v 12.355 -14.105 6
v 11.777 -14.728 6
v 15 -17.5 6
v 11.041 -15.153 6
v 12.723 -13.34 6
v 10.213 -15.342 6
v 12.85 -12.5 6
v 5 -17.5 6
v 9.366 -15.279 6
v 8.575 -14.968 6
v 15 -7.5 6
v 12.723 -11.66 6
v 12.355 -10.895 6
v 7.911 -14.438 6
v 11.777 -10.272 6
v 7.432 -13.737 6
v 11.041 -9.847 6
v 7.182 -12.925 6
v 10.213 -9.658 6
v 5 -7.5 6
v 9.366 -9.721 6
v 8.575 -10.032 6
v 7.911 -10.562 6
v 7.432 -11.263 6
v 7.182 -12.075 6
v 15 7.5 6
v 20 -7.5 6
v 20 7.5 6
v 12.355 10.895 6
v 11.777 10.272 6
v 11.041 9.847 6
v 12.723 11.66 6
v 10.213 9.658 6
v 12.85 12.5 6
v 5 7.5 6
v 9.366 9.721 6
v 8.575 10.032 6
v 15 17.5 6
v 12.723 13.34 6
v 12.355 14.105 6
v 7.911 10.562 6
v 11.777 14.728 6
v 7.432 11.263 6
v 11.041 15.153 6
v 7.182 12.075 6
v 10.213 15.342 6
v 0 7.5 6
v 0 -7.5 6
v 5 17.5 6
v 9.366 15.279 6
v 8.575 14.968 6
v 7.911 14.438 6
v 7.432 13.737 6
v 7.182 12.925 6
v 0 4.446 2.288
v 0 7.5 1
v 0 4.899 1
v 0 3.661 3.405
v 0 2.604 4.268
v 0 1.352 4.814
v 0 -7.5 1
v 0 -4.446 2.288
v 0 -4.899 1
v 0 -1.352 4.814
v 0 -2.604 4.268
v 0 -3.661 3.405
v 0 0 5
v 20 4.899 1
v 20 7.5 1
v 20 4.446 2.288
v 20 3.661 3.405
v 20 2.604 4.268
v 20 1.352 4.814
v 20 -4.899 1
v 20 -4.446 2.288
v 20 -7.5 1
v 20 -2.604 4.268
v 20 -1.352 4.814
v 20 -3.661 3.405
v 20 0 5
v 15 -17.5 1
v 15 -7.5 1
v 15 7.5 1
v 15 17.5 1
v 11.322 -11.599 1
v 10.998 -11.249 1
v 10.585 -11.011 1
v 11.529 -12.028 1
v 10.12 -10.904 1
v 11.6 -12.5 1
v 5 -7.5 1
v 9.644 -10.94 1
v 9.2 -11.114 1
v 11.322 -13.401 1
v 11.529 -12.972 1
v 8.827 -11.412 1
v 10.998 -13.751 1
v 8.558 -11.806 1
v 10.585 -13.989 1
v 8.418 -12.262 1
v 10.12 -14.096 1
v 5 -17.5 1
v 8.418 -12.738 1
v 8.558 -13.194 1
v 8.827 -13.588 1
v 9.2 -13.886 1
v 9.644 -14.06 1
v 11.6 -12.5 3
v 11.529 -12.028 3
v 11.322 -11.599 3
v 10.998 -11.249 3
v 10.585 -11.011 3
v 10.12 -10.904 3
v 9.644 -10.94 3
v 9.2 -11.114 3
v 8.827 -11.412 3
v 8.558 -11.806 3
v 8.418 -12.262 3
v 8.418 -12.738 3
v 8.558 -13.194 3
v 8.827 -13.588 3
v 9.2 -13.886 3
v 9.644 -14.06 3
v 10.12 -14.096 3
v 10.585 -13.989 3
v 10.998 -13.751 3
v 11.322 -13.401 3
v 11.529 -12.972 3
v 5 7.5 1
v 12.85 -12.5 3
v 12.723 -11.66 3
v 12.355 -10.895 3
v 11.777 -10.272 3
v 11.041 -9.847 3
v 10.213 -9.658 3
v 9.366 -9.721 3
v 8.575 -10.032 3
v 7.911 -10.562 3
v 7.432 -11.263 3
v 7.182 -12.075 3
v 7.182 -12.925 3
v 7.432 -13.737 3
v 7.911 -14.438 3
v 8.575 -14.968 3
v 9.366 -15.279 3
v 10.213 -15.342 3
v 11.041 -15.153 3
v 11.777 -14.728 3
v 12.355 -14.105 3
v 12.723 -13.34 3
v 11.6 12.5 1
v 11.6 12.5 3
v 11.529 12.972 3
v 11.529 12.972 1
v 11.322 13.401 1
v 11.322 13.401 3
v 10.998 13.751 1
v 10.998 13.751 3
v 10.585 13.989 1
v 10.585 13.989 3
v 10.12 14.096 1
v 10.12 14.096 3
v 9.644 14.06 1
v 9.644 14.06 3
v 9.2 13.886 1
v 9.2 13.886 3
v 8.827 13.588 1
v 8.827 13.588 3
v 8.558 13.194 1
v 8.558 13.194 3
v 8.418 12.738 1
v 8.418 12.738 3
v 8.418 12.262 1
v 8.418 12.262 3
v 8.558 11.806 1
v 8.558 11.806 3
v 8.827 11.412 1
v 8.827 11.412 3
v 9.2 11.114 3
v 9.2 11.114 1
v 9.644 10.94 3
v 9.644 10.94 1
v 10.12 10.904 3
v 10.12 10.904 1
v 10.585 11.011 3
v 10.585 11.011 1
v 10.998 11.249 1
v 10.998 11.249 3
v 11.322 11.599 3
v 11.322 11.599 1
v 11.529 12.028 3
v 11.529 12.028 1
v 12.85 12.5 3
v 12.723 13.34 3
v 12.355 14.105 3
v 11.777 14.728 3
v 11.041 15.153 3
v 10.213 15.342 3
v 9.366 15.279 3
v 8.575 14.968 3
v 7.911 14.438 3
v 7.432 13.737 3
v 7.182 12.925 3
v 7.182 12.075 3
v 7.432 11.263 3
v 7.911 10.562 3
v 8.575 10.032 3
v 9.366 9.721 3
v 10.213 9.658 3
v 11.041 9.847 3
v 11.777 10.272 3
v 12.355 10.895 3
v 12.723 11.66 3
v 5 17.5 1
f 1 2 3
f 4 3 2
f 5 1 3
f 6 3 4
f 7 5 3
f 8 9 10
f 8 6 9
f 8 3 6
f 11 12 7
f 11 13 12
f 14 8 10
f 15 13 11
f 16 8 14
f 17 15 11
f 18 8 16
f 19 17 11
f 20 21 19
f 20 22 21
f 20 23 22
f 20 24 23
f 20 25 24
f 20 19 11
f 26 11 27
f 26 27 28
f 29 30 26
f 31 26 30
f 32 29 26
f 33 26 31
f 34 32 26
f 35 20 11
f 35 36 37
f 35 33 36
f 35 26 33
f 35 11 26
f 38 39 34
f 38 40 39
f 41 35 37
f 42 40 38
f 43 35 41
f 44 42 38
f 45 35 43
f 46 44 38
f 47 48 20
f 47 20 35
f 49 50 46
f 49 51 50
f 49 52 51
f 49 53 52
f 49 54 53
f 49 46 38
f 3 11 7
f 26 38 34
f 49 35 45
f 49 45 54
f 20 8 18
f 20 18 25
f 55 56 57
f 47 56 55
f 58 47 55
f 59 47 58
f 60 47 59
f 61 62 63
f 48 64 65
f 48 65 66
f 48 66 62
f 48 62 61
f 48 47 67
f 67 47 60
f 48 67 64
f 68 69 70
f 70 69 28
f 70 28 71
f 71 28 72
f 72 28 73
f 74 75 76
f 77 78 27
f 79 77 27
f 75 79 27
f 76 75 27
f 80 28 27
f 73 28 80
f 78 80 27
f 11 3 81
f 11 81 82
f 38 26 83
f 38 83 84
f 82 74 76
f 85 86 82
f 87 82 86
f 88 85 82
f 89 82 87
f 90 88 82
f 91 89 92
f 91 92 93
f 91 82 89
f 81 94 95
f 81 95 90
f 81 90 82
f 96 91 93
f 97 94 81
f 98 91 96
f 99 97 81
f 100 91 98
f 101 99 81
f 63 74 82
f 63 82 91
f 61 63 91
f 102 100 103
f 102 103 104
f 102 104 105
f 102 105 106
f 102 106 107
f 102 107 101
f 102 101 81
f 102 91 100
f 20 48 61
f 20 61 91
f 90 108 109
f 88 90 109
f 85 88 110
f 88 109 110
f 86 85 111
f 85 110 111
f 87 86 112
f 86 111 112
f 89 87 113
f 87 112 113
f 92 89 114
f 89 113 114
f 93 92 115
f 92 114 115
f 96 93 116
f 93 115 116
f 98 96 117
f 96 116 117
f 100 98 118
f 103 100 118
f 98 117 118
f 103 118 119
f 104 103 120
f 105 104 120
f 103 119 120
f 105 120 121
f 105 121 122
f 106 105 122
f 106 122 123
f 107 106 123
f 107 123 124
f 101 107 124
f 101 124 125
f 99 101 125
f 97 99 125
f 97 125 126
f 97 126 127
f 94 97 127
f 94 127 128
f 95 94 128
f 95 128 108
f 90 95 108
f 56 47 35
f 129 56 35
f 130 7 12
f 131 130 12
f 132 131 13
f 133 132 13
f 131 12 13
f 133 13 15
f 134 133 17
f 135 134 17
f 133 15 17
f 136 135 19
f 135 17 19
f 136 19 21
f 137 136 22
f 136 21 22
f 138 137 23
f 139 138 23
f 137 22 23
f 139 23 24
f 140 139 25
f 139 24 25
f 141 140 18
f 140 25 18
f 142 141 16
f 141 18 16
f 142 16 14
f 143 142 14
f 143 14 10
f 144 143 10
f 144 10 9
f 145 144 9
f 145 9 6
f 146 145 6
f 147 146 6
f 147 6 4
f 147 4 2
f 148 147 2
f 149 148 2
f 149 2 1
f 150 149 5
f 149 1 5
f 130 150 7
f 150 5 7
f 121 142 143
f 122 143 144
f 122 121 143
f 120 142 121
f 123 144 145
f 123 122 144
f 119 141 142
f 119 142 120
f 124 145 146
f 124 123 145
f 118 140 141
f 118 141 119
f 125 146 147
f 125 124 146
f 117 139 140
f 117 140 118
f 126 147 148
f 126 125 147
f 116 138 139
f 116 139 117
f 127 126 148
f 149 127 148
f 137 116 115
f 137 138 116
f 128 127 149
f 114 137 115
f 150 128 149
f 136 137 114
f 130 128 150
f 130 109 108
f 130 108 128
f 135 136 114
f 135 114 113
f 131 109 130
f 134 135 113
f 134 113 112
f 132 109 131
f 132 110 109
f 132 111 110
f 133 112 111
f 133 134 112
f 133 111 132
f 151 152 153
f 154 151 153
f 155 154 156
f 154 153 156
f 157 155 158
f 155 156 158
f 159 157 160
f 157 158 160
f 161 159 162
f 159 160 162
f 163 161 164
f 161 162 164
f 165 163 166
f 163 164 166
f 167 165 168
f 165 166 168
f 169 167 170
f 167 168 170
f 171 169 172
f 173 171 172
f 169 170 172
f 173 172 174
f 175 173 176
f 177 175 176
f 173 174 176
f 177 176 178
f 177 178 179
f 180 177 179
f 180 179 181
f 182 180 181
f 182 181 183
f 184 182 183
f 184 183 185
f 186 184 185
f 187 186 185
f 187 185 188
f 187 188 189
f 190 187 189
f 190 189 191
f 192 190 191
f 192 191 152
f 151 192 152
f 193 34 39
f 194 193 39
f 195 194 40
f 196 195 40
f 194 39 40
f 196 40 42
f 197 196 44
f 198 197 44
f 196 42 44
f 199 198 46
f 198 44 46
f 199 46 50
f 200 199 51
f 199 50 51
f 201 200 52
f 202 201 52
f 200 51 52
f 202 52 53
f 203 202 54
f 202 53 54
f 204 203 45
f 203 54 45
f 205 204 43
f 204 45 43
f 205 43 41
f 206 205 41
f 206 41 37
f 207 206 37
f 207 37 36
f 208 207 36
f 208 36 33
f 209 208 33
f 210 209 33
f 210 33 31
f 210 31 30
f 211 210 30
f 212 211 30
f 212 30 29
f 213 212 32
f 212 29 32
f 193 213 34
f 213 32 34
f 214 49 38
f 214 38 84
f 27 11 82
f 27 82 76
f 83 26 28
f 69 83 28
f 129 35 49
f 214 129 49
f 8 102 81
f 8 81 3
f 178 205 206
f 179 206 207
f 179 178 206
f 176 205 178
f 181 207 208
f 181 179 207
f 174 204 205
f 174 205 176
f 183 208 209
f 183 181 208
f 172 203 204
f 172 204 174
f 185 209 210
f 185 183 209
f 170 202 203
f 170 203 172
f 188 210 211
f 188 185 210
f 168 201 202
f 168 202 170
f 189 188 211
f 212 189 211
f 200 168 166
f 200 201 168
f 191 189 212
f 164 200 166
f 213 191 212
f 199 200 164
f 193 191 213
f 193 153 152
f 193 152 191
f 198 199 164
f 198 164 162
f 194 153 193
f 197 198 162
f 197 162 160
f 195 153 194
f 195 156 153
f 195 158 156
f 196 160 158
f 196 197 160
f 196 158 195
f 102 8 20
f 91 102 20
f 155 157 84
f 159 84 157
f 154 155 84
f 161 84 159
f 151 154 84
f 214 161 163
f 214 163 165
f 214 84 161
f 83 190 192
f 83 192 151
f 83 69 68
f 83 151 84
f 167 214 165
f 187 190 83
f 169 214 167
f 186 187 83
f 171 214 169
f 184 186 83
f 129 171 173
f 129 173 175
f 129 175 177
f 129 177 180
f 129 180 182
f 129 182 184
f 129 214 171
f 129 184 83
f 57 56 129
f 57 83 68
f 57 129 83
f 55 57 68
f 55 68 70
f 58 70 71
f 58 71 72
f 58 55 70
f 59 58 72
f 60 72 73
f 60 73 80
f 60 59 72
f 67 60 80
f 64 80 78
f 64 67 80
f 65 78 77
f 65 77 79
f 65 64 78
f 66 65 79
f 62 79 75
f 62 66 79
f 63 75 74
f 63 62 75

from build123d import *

# Parameters (mm, degrees)
BOSS_EXTRUDE1_DEPTH     = 20
SKETCH2_W               = 5
SKETCH2_H               = 10
SKETCH2_R               = 1.6
CUT_EXTRUDE1_DEPTH      = 1
CUT_EXTRUDE1_DEPTH_BACK = 6
SKETCH2_3_R             = 2.85
SKETCH2_3_R_2           = 1.6
CUT_EXTRUDE2_DEPTH      = 1
CUT_EXTRUDE2_DEPTH_BACK = 3


with BuildPart() as part:
    # Sketch1 → Boss-Extrude1 (new body)
    with BuildSketch(Plane.YZ):
        with BuildLine():
            ThreePointArc((4.898979486, 1), (0, 5), (-4.898979486, 1))
            Line((-4.898979486, 1), (-17.5, 1))
            Line((-17.5, 1), (-17.5, 6))
            Line((-17.5, 6), (17.5, 6))
            Line((17.5, 6), (17.5, 1))
            Line((17.5, 1), (4.898979486, 1))
        make_face()
    extrude(amount=BOSS_EXTRUDE1_DEPTH)

    # Sketch2 → Cut-Extrude1 (cut, two sides)
    with BuildSketch(Plane.XY.offset(6)) as cut_extrude1_sk:
        with Locations((2.5, -12.5)):
            Rectangle(SKETCH2_W, SKETCH2_H)
        with Locations((2.5, 12.5)):
            Rectangle(SKETCH2_W, SKETCH2_H)
        with Locations((17.5, 12.5)):
            Rectangle(SKETCH2_W, SKETCH2_H)
        with Locations((17.5, -12.5)):
            Rectangle(SKETCH2_W, SKETCH2_H)
        with Locations((10, -12.5)):
            Circle(SKETCH2_R)
        with Locations((10, 12.5)):
            Circle(SKETCH2_R)
    extrude(amount=CUT_EXTRUDE1_DEPTH, mode=Mode.SUBTRACT)
    extrude(cut_extrude1_sk.sketch, amount=-CUT_EXTRUDE1_DEPTH_BACK, mode=Mode.SUBTRACT)

    # Sketch2<3> → Cut-Extrude2 (cut, two sides)
    with BuildSketch(Plane.XY.offset(6)) as cut_extrude2_sk:
        with Locations((10, -12.5)):
            Circle(SKETCH2_3_R)
        with Locations((10, -12.5)):
            Circle(SKETCH2_3_R_2, mode=Mode.SUBTRACT)
        with Locations((10, 12.5)):
            Circle(SKETCH2_3_R)
        with Locations((10, 12.5)):
            Circle(SKETCH2_3_R_2, mode=Mode.SUBTRACT)
    extrude(amount=CUT_EXTRUDE2_DEPTH, mode=Mode.SUBTRACT)
    extrude(cut_extrude2_sk.sketch, amount=-CUT_EXTRUDE2_DEPTH_BACK, mode=Mode.SUBTRACT)


solid = part.part
